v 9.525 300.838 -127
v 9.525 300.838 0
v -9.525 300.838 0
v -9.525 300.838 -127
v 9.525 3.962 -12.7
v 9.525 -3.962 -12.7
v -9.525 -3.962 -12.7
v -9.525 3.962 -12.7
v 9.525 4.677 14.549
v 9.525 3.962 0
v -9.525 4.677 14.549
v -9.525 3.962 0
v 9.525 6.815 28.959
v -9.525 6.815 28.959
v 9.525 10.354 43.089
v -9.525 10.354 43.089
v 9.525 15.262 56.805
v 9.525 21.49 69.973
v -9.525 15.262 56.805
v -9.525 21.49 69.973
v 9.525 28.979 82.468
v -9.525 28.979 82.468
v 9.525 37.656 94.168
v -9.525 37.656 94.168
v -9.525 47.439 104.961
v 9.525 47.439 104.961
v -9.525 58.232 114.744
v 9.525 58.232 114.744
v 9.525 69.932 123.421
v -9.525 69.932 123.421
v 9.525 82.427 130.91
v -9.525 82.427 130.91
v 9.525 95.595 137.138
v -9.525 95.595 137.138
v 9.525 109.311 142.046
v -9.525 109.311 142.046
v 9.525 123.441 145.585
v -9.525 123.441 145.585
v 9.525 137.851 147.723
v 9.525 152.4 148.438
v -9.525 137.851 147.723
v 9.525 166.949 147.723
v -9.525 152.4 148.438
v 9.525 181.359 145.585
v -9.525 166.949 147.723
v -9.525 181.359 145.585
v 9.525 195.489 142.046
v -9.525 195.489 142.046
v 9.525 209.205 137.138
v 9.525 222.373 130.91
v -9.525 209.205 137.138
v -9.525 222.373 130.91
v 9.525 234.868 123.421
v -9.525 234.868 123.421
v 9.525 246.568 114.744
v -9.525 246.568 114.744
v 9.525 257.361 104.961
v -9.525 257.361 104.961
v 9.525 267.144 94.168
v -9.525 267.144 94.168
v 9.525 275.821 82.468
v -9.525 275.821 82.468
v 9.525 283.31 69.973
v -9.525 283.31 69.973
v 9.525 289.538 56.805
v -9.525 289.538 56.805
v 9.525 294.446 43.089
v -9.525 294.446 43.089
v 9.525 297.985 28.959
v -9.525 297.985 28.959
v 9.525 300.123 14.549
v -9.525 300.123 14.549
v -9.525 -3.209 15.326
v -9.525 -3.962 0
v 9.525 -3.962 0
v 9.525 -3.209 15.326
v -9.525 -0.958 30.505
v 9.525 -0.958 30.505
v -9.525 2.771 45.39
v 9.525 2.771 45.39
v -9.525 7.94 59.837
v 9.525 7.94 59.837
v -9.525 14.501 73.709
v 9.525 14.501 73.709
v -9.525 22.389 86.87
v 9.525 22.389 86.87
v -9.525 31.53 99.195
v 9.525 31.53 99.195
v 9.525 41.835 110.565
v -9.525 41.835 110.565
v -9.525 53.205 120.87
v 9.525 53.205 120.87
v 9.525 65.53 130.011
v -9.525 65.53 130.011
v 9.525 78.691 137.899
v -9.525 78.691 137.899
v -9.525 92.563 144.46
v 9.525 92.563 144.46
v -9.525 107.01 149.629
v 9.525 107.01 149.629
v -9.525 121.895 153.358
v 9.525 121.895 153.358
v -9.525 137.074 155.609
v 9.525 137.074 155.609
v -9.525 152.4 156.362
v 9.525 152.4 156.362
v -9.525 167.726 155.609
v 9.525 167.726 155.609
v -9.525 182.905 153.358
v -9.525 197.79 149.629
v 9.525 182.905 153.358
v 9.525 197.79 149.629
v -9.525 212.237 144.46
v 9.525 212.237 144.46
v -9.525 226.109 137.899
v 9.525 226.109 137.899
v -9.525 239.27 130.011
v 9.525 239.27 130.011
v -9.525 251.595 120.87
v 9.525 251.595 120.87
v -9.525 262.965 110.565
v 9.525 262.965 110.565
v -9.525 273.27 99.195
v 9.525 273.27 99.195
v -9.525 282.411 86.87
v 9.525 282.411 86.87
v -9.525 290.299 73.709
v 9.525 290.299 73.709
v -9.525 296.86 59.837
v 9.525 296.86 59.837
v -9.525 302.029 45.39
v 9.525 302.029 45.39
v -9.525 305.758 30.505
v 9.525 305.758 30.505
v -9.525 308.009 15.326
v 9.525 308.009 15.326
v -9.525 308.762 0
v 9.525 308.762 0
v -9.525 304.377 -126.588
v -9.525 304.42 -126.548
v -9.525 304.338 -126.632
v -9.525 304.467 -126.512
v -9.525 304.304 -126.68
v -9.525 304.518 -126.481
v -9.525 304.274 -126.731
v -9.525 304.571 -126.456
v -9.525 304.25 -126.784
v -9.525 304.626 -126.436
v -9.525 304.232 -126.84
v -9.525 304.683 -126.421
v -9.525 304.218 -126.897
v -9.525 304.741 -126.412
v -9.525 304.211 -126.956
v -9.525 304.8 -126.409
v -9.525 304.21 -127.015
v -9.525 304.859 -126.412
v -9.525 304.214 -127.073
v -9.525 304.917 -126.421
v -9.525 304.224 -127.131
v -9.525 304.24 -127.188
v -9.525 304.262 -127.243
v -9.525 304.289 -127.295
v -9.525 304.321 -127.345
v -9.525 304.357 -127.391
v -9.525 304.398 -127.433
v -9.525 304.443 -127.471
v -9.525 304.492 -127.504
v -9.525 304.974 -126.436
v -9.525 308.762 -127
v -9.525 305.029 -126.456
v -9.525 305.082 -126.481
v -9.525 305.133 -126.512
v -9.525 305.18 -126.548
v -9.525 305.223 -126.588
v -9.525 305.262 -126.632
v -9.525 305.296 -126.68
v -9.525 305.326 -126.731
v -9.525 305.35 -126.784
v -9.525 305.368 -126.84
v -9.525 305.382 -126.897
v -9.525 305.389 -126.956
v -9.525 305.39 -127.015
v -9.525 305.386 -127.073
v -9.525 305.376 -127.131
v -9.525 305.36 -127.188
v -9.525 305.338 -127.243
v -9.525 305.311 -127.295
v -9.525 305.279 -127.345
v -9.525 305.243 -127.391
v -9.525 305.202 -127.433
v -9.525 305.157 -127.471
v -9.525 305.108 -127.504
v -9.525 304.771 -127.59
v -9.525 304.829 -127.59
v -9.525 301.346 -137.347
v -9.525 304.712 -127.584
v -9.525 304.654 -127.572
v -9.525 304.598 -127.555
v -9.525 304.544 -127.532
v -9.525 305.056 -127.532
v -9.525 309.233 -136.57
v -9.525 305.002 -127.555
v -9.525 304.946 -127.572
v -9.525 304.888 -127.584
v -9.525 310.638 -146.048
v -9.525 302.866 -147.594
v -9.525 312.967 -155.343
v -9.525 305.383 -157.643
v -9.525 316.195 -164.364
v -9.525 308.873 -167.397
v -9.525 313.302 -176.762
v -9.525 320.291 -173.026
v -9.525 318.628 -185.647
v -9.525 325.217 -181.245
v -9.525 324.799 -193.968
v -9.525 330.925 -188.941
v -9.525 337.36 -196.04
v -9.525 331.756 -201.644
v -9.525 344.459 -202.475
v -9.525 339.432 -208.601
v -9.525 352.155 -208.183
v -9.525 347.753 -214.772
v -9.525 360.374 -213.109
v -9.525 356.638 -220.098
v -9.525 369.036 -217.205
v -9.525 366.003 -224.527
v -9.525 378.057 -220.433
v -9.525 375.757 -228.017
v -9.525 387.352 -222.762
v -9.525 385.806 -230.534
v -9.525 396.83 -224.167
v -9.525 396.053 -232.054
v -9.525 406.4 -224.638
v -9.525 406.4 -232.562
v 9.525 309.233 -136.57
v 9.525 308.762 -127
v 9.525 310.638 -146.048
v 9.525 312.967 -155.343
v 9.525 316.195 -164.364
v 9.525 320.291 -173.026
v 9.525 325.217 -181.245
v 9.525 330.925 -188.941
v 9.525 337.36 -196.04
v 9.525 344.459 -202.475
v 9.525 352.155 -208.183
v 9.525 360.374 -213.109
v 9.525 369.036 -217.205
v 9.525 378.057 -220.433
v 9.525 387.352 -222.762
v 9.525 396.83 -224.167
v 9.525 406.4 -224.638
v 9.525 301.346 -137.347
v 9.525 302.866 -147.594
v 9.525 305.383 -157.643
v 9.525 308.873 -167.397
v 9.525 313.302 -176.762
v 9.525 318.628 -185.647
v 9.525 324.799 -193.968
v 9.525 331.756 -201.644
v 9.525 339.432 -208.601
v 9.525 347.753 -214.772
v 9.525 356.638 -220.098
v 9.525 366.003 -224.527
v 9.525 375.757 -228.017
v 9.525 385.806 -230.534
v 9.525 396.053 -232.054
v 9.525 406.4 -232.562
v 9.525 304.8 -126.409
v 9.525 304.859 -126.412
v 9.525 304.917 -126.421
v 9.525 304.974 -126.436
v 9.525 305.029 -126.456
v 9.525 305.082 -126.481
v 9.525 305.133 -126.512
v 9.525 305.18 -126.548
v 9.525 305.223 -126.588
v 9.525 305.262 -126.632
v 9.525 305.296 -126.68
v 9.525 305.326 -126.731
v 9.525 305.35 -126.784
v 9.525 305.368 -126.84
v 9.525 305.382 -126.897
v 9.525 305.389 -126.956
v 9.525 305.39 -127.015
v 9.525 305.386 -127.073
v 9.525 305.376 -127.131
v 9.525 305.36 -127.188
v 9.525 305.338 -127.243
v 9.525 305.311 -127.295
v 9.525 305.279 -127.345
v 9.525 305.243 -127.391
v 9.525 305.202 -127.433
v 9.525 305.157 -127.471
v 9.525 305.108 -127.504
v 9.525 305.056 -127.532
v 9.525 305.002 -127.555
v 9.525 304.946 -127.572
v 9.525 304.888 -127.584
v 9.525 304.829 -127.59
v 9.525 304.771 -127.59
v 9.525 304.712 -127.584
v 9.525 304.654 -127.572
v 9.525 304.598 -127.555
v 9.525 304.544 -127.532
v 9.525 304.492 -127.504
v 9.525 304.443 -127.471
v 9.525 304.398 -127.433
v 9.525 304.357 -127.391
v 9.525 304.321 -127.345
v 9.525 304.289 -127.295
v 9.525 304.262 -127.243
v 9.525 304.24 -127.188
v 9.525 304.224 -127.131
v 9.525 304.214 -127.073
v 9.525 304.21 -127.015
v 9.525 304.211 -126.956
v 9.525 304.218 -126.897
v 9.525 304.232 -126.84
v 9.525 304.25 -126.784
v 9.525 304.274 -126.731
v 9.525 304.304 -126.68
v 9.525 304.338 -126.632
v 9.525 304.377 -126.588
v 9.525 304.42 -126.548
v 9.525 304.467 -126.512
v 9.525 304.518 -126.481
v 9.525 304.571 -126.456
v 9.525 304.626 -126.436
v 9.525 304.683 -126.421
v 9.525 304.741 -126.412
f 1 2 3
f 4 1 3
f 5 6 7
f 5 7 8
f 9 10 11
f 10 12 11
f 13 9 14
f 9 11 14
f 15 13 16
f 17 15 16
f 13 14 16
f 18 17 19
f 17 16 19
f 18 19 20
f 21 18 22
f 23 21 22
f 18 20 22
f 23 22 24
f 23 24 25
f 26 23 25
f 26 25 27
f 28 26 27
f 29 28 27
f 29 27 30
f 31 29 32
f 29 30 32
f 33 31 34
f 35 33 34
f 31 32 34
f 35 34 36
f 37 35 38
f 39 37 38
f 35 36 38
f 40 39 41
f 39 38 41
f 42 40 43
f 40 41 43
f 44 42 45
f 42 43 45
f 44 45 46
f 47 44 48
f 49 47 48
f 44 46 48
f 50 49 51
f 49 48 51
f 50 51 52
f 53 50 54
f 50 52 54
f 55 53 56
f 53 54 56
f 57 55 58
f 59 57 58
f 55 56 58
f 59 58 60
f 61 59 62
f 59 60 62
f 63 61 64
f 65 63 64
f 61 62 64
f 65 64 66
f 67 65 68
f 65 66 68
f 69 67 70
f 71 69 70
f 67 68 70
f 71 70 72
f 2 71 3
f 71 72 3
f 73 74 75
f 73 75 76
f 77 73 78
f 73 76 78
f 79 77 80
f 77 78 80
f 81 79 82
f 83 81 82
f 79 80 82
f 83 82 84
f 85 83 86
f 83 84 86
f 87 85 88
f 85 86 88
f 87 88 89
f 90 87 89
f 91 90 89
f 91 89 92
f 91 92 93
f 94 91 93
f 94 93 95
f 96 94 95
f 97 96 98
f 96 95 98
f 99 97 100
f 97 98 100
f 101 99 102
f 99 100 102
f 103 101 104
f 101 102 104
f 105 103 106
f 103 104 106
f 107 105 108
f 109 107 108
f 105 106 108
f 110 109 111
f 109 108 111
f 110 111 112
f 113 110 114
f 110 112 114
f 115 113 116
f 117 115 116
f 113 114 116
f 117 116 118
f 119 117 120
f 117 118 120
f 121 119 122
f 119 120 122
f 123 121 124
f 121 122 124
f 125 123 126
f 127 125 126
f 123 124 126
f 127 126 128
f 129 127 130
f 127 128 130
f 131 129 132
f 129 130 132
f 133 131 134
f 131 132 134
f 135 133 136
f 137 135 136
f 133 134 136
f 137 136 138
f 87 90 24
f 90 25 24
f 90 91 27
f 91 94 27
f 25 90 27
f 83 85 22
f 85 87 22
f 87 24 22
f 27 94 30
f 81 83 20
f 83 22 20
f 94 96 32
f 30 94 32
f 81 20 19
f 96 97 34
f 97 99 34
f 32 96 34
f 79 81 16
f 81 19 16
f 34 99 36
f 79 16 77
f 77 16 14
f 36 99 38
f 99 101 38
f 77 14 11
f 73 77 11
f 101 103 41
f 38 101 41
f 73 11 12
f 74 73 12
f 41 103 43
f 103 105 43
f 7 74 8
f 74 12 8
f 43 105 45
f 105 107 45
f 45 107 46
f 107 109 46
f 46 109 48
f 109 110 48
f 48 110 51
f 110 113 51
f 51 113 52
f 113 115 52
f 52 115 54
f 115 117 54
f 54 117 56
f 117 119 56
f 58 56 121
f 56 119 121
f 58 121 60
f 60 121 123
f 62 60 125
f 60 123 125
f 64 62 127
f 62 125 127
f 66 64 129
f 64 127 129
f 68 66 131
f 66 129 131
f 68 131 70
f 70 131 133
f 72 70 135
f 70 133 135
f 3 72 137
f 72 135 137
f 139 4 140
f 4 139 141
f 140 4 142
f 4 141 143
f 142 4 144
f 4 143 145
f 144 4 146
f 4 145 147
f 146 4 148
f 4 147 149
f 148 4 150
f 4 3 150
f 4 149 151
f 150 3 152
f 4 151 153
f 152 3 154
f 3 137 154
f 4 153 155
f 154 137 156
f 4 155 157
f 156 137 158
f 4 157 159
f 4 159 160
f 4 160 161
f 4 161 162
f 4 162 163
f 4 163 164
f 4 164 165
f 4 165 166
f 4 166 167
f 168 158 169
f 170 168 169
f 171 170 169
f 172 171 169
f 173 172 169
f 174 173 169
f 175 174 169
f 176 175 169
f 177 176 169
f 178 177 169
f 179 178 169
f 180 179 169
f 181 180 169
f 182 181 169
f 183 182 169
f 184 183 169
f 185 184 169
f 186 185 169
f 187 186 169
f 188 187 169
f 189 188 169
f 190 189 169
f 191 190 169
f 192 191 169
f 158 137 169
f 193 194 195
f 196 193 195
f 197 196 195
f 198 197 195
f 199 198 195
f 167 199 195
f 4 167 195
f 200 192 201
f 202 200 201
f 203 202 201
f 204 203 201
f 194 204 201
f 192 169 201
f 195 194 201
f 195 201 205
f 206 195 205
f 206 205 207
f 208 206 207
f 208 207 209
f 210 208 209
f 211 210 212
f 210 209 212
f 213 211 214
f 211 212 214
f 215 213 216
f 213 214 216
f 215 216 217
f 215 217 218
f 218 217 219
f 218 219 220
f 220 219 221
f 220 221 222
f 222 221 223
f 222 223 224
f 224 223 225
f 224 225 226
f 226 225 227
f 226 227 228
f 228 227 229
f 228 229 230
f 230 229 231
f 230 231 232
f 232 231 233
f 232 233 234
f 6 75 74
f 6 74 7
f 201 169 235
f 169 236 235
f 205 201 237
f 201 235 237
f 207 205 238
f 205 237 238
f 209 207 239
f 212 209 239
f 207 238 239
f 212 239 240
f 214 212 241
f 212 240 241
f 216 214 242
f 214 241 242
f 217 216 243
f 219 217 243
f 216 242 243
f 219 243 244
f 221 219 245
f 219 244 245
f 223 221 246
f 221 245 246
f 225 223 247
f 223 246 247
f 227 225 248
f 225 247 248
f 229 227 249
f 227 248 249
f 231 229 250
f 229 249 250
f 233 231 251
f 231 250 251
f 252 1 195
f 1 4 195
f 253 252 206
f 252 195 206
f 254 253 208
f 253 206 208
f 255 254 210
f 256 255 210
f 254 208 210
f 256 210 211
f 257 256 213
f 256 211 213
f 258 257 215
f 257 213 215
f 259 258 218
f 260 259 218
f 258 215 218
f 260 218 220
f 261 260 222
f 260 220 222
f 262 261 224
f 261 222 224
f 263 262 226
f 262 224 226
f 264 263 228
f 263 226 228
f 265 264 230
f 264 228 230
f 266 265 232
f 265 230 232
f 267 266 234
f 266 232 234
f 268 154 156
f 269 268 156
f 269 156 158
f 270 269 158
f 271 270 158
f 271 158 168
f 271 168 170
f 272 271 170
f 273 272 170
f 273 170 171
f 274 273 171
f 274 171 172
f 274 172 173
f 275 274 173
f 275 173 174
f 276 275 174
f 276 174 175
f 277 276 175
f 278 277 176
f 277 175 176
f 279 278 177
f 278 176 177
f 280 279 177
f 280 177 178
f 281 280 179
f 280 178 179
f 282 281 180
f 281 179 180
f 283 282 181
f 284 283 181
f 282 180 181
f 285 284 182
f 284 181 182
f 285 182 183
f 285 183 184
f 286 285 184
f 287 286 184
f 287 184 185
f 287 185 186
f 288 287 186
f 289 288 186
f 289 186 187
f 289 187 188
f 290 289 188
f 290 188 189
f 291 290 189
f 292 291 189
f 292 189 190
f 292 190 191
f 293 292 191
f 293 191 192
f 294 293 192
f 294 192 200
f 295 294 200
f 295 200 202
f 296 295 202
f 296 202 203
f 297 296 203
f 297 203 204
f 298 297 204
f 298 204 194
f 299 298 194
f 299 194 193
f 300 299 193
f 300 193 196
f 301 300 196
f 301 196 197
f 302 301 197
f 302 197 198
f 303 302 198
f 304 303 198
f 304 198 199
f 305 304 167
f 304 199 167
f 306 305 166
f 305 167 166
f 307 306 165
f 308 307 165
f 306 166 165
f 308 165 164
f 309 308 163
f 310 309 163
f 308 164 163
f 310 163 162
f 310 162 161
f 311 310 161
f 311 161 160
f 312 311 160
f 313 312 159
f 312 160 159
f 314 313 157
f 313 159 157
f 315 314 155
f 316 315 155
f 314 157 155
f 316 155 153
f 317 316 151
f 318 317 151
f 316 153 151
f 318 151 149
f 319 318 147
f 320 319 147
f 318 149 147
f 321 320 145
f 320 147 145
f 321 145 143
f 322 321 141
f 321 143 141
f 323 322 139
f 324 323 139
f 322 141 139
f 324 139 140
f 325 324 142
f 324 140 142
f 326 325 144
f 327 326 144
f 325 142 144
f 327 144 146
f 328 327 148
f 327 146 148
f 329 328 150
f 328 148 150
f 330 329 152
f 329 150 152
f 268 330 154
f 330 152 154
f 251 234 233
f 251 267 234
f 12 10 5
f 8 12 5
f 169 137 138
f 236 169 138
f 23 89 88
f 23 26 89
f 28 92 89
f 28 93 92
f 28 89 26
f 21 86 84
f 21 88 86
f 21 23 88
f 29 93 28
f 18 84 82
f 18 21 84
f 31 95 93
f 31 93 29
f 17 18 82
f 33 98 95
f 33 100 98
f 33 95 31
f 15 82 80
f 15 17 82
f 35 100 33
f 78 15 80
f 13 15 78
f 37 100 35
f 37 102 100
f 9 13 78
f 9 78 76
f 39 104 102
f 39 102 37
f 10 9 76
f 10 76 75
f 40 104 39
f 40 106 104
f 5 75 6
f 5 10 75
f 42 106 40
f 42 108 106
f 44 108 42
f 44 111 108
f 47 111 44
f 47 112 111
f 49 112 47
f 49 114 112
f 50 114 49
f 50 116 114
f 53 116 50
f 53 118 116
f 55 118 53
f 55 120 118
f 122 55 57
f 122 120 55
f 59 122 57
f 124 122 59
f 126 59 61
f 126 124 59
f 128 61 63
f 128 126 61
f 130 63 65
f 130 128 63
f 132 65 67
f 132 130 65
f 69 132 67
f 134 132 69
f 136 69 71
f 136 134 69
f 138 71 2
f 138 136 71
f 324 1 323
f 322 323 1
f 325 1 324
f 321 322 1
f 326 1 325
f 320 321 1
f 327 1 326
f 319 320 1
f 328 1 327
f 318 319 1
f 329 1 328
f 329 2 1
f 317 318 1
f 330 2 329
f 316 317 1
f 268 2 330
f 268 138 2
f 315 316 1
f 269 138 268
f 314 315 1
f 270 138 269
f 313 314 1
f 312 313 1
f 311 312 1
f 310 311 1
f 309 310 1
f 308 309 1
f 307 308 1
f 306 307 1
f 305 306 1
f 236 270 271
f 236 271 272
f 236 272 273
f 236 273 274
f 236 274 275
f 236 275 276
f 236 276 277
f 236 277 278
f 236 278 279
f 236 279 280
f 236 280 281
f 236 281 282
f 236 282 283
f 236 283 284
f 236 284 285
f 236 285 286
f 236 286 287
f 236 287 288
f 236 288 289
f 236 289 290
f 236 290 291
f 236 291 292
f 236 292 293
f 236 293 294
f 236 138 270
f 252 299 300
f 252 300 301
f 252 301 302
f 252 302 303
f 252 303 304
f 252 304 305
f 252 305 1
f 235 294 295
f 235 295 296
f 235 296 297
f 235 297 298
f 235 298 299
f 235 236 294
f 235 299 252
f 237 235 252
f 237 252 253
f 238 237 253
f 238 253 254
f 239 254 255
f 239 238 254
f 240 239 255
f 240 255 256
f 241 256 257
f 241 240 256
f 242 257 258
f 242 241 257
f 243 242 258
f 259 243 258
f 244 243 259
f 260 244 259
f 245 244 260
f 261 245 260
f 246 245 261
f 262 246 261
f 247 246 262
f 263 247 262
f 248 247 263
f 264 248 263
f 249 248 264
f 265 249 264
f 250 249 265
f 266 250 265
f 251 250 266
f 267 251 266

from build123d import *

# Parameters (mm, degrees)
SKETCH1_W                    = 19.05
SKETCH1_H                    = 7.9248
SKETCH3_W                    = 12.7
SKETCH3_H                    = 7.9248
BOSS_EXTRUDE1_DEPTH          = 19.05
F_56_0_0465_DIAMETER_HOLE1_D = 1.1811


with BuildPart() as part:
    # Sweep1: sweep along a path in Sketch2
    with BuildLine(Plane(origin=(0, 0, 0), x_dir=(0, 0, -1), z_dir=(1, 0, 0))) as sweep1_path:
        ThreePointArc((0, 0), (-152.4, 152.4), (0, 304.8))
        Line((0, 304.8), (127, 304.8))
        ThreePointArc((127, 304.8), (198.842048969, 334.557951031), (228.6, 406.4))
    # Sketch1 → Sweep1 (sweep)
    with BuildSketch(Plane.XY):
        Rectangle(SKETCH1_W, SKETCH1_H)
    sweep(path=sweep1_path.line)

    # Sketch3 → Boss-Extrude1 (add)
    with BuildSketch(Plane(origin=(9.525, 0, 0), x_dir=(0, 0, -1), z_dir=(1, 0, 0))):
        with Locations((6.35, 0)):
            Rectangle(SKETCH3_W, SKETCH3_H)
    extrude(amount=-BOSS_EXTRUDE1_DEPTH)

    # #56 (0.0465) Diameter Hole1 (through all)
    with Locations(Plane(origin=(9.525, 0, 0), x_dir=(0, 0, -1), z_dir=(1, 0, 0))):
        with Locations((127, 304.8)):
            Hole(F_56_0_0465_DIAMETER_HOLE1_D / 2)


solid = part.part
